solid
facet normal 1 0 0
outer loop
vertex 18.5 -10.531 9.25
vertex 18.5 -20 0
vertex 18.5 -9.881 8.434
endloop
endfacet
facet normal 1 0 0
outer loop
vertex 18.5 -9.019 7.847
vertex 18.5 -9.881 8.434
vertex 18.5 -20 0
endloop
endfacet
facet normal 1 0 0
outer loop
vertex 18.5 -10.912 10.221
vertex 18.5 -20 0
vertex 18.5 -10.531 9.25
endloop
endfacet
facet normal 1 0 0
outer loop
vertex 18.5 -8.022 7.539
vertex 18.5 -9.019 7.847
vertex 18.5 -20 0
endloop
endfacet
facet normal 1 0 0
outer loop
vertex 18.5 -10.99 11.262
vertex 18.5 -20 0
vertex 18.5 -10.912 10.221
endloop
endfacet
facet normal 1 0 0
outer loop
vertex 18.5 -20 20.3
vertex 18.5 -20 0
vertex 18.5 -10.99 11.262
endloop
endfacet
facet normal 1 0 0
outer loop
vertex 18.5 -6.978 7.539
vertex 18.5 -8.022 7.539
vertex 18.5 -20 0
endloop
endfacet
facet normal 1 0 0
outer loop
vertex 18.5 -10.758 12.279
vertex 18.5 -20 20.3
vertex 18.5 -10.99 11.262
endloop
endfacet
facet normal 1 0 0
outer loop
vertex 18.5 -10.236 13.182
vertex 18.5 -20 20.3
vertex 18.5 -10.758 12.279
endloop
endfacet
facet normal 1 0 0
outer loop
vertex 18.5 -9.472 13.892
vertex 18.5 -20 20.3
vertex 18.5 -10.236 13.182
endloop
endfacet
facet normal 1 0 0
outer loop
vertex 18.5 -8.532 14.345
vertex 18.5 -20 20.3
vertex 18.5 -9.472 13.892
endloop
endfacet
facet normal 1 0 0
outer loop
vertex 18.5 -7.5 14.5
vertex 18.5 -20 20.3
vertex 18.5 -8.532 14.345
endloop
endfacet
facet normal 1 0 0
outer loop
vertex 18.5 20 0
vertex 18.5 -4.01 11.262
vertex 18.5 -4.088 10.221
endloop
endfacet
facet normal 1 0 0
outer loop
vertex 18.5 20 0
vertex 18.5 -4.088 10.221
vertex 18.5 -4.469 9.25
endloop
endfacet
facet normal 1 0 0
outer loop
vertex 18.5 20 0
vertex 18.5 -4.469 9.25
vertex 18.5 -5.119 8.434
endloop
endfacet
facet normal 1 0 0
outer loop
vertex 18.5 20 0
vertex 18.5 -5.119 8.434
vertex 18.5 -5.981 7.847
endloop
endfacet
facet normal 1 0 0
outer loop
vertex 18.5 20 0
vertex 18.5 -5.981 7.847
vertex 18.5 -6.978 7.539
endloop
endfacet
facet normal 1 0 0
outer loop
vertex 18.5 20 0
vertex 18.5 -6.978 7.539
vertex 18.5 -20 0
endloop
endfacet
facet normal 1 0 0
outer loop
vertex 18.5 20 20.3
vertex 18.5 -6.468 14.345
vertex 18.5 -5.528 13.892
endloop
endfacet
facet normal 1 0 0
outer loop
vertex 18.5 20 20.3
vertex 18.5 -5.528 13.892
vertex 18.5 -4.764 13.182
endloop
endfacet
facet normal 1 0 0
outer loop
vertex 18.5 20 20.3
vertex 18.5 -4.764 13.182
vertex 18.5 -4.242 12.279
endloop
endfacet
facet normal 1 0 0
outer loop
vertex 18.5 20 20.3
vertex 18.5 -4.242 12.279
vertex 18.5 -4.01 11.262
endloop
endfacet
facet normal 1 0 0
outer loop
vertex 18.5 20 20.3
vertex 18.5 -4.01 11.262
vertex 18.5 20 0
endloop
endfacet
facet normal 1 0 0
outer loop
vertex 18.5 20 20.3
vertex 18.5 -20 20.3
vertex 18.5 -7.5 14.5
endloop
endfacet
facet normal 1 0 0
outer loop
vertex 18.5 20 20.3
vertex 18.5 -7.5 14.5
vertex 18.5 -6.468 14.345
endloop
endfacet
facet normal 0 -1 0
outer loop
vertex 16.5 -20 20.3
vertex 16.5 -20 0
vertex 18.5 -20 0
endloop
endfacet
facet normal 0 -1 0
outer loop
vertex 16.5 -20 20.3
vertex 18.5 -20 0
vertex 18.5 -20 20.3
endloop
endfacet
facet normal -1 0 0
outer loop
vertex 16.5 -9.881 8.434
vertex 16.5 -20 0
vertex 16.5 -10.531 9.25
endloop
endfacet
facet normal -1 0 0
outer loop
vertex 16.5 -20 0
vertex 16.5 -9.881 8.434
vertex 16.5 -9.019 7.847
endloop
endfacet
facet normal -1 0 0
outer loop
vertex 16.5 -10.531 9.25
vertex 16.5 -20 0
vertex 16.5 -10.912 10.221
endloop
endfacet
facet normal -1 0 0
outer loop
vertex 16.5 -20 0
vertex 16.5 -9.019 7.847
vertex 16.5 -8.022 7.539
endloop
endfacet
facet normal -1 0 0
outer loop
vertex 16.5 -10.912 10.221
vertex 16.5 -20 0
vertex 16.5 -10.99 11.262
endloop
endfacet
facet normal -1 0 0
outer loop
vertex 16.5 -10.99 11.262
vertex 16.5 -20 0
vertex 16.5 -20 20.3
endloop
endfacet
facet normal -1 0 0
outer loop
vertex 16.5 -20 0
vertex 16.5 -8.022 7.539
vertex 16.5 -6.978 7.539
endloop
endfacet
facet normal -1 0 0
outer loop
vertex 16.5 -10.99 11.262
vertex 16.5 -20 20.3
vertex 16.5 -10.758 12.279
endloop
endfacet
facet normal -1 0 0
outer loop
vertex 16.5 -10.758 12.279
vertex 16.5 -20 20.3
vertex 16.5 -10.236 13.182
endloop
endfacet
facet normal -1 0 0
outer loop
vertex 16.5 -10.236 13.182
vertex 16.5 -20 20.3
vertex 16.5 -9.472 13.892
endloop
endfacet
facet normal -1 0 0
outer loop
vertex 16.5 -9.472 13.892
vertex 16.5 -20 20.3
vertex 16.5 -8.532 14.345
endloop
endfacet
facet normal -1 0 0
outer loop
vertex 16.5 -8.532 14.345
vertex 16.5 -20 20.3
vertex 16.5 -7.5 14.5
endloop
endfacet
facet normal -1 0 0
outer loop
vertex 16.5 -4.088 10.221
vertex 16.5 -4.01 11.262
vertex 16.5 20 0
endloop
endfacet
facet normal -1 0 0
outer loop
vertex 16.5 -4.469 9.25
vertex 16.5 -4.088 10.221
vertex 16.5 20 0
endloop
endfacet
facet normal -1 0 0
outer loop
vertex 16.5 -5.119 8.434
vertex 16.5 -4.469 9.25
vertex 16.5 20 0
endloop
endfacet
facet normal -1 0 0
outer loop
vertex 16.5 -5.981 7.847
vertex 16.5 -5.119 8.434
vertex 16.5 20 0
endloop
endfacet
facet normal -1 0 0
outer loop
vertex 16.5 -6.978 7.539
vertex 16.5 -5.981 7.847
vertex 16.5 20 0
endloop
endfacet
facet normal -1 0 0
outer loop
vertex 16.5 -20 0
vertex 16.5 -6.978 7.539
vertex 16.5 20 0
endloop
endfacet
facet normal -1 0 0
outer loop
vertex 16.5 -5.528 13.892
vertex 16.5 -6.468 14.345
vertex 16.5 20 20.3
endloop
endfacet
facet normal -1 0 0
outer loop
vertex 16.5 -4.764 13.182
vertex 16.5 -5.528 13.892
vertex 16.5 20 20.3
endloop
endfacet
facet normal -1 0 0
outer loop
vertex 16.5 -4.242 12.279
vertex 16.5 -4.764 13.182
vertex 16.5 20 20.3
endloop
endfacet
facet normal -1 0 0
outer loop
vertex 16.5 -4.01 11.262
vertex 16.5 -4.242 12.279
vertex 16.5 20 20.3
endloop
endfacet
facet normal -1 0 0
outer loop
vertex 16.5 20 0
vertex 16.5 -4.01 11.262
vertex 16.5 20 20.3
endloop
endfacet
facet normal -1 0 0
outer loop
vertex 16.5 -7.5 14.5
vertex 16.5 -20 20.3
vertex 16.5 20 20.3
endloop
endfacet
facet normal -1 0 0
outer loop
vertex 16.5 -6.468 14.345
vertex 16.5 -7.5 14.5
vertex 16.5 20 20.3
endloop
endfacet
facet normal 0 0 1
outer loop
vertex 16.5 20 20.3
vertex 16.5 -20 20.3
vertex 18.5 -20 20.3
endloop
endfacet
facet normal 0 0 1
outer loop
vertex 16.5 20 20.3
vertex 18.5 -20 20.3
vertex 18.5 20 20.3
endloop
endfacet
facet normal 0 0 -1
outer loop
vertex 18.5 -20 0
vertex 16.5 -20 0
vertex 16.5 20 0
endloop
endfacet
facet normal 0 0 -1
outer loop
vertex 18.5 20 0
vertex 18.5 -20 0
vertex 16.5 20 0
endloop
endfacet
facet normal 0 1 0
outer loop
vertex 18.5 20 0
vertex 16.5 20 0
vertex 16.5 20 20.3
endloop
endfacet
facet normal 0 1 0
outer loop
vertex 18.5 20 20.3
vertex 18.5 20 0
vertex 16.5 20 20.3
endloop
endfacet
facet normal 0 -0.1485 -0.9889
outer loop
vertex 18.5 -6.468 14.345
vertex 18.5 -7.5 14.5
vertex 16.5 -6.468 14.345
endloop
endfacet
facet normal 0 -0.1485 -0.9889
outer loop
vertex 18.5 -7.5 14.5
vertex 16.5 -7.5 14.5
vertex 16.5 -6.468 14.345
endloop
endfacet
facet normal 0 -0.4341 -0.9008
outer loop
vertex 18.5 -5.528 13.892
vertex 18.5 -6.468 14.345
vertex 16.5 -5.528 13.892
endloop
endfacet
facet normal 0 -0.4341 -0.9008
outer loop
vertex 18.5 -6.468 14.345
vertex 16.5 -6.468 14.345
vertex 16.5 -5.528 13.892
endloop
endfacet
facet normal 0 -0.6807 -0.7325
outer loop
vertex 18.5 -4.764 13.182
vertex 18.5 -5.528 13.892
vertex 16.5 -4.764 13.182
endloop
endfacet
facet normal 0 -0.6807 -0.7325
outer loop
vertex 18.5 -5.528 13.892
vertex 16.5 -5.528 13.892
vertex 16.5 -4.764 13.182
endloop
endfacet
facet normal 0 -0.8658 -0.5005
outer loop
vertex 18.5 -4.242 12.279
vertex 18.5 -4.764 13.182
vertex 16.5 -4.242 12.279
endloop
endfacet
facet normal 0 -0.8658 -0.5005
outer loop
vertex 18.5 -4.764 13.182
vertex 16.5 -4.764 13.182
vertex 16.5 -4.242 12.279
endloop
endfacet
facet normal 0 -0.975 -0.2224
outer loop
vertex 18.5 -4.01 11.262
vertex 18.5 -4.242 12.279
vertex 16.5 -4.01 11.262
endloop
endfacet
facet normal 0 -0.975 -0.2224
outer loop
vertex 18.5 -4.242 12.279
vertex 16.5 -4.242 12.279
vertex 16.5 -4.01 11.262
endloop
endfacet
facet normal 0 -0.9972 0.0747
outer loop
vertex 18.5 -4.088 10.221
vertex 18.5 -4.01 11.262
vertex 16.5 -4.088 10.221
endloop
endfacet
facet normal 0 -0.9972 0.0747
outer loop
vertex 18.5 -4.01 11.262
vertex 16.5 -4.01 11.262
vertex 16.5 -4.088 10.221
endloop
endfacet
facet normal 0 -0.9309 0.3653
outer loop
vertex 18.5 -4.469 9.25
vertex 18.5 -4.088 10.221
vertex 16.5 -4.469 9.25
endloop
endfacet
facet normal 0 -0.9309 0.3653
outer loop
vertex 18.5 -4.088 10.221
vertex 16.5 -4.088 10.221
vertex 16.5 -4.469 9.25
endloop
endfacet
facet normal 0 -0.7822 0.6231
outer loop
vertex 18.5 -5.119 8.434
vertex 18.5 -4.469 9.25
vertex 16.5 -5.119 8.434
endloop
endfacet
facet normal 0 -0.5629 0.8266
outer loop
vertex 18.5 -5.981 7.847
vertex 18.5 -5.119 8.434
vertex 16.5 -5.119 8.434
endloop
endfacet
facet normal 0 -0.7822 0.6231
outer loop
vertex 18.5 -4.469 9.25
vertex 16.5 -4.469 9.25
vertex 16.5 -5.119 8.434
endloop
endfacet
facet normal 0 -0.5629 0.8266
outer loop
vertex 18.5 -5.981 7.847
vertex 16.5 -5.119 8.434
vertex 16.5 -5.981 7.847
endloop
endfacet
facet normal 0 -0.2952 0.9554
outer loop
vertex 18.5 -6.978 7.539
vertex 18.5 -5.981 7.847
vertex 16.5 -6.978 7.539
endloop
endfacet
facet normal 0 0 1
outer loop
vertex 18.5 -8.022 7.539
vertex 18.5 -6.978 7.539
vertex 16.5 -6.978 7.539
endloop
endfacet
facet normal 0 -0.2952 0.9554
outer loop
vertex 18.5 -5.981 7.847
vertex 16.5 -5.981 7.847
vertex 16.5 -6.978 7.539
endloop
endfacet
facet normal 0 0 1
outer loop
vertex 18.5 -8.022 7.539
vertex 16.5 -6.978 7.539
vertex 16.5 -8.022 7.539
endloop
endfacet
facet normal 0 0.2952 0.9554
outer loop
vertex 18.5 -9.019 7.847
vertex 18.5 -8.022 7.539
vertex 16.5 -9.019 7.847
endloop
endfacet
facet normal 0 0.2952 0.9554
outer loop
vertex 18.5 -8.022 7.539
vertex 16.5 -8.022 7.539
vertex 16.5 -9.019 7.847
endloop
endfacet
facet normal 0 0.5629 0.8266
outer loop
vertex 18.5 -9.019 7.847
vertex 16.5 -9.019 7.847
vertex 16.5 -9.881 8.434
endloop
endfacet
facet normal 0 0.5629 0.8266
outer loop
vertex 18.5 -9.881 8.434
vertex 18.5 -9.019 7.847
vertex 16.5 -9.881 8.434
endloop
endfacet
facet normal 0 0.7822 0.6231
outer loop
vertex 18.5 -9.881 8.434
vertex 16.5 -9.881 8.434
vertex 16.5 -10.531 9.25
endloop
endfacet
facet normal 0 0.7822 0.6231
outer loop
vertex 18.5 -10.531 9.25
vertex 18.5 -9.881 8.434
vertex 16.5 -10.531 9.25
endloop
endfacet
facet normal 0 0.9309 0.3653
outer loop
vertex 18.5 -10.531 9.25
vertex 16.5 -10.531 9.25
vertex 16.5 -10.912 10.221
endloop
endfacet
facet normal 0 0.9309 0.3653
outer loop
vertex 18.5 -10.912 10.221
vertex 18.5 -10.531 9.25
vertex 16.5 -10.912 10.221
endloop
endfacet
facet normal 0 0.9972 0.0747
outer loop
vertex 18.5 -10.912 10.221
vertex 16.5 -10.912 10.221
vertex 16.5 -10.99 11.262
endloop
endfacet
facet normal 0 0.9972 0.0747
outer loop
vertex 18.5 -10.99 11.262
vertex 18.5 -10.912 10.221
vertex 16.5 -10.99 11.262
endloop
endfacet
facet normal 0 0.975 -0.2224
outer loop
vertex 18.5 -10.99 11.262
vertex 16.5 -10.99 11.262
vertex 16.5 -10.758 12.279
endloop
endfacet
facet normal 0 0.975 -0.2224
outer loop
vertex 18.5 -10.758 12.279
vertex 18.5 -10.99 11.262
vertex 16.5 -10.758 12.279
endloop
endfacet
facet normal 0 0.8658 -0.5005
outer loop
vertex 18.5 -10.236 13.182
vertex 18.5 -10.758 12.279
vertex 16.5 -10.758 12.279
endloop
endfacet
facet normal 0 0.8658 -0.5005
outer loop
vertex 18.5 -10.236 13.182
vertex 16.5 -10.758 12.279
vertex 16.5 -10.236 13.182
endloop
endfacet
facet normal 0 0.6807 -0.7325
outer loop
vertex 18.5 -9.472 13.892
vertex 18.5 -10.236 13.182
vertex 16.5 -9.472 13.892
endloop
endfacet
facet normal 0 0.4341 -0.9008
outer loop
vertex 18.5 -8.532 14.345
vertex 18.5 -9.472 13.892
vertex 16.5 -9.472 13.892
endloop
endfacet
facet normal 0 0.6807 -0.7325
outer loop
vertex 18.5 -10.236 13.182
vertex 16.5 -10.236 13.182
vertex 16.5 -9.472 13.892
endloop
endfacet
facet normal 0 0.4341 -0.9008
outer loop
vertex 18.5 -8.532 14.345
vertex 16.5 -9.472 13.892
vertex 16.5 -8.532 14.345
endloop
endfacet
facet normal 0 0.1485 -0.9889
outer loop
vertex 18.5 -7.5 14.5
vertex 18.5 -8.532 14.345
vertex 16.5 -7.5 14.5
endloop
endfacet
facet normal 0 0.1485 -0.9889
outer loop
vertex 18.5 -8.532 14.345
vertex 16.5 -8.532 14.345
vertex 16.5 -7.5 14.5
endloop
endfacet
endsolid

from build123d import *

# Parameters (mm, degrees)
SKETCH007_W             = 18.5
SKETCH007_H             = 4
SKETCH007_W_2           = 5.2
SKETCH007_H_2           = 3.5
BODY006_PLACEMENT_ANGLE = 180
SKETCH005_W             = 40
SKETCH005_H             = 20.3
PAD006_DEPTH            = 2


with BuildPart() as audio_socket_mockup:
    # Sketch007 → Revolution001 (revolve)
    with BuildSketch(Plane.XZ):
        with Locations((9.25, 2)):
            Rectangle(SKETCH007_W, SKETCH007_H)
        with Locations((-2.6, 1.75)):
            Rectangle(SKETCH007_W_2, SKETCH007_H_2)
    revolve(axis=Axis((0, 0, 0), (1, 0, 0)))


with BuildPart() as audio_socket_mockup_1:
    # Body006 placement: moved
    add(audio_socket_mockup.part.moved(Location((18, -7.5, 11))).rotate(Axis((18, -7.5, 11), (0, 0, 1)), BODY006_PLACEMENT_ANGLE))


with BuildPart() as audio_cut:
    # Sketch005 → Pad006 (new body)
    with BuildSketch(Plane.YZ):
        with Locations((0, 10.15)):
            Rectangle(SKETCH005_W, SKETCH005_H)
    extrude(amount=PAD006_DEPTH)


with BuildPart() as audio_cut_1:
    # Body004 placement: moved
    add(audio_cut.part.moved(Location((18, 0, 0))))

    # Cut001: cut audio socket mockup
    add(audio_socket_mockup_1.part, mode=Mode.SUBTRACT)


with BuildPart() as audio_cut_2:
    # Cut001 placement: moved
    add(audio_cut_1.part.moved(Location((-1.5, 0, 0))))


solid = audio_cut_2.part
